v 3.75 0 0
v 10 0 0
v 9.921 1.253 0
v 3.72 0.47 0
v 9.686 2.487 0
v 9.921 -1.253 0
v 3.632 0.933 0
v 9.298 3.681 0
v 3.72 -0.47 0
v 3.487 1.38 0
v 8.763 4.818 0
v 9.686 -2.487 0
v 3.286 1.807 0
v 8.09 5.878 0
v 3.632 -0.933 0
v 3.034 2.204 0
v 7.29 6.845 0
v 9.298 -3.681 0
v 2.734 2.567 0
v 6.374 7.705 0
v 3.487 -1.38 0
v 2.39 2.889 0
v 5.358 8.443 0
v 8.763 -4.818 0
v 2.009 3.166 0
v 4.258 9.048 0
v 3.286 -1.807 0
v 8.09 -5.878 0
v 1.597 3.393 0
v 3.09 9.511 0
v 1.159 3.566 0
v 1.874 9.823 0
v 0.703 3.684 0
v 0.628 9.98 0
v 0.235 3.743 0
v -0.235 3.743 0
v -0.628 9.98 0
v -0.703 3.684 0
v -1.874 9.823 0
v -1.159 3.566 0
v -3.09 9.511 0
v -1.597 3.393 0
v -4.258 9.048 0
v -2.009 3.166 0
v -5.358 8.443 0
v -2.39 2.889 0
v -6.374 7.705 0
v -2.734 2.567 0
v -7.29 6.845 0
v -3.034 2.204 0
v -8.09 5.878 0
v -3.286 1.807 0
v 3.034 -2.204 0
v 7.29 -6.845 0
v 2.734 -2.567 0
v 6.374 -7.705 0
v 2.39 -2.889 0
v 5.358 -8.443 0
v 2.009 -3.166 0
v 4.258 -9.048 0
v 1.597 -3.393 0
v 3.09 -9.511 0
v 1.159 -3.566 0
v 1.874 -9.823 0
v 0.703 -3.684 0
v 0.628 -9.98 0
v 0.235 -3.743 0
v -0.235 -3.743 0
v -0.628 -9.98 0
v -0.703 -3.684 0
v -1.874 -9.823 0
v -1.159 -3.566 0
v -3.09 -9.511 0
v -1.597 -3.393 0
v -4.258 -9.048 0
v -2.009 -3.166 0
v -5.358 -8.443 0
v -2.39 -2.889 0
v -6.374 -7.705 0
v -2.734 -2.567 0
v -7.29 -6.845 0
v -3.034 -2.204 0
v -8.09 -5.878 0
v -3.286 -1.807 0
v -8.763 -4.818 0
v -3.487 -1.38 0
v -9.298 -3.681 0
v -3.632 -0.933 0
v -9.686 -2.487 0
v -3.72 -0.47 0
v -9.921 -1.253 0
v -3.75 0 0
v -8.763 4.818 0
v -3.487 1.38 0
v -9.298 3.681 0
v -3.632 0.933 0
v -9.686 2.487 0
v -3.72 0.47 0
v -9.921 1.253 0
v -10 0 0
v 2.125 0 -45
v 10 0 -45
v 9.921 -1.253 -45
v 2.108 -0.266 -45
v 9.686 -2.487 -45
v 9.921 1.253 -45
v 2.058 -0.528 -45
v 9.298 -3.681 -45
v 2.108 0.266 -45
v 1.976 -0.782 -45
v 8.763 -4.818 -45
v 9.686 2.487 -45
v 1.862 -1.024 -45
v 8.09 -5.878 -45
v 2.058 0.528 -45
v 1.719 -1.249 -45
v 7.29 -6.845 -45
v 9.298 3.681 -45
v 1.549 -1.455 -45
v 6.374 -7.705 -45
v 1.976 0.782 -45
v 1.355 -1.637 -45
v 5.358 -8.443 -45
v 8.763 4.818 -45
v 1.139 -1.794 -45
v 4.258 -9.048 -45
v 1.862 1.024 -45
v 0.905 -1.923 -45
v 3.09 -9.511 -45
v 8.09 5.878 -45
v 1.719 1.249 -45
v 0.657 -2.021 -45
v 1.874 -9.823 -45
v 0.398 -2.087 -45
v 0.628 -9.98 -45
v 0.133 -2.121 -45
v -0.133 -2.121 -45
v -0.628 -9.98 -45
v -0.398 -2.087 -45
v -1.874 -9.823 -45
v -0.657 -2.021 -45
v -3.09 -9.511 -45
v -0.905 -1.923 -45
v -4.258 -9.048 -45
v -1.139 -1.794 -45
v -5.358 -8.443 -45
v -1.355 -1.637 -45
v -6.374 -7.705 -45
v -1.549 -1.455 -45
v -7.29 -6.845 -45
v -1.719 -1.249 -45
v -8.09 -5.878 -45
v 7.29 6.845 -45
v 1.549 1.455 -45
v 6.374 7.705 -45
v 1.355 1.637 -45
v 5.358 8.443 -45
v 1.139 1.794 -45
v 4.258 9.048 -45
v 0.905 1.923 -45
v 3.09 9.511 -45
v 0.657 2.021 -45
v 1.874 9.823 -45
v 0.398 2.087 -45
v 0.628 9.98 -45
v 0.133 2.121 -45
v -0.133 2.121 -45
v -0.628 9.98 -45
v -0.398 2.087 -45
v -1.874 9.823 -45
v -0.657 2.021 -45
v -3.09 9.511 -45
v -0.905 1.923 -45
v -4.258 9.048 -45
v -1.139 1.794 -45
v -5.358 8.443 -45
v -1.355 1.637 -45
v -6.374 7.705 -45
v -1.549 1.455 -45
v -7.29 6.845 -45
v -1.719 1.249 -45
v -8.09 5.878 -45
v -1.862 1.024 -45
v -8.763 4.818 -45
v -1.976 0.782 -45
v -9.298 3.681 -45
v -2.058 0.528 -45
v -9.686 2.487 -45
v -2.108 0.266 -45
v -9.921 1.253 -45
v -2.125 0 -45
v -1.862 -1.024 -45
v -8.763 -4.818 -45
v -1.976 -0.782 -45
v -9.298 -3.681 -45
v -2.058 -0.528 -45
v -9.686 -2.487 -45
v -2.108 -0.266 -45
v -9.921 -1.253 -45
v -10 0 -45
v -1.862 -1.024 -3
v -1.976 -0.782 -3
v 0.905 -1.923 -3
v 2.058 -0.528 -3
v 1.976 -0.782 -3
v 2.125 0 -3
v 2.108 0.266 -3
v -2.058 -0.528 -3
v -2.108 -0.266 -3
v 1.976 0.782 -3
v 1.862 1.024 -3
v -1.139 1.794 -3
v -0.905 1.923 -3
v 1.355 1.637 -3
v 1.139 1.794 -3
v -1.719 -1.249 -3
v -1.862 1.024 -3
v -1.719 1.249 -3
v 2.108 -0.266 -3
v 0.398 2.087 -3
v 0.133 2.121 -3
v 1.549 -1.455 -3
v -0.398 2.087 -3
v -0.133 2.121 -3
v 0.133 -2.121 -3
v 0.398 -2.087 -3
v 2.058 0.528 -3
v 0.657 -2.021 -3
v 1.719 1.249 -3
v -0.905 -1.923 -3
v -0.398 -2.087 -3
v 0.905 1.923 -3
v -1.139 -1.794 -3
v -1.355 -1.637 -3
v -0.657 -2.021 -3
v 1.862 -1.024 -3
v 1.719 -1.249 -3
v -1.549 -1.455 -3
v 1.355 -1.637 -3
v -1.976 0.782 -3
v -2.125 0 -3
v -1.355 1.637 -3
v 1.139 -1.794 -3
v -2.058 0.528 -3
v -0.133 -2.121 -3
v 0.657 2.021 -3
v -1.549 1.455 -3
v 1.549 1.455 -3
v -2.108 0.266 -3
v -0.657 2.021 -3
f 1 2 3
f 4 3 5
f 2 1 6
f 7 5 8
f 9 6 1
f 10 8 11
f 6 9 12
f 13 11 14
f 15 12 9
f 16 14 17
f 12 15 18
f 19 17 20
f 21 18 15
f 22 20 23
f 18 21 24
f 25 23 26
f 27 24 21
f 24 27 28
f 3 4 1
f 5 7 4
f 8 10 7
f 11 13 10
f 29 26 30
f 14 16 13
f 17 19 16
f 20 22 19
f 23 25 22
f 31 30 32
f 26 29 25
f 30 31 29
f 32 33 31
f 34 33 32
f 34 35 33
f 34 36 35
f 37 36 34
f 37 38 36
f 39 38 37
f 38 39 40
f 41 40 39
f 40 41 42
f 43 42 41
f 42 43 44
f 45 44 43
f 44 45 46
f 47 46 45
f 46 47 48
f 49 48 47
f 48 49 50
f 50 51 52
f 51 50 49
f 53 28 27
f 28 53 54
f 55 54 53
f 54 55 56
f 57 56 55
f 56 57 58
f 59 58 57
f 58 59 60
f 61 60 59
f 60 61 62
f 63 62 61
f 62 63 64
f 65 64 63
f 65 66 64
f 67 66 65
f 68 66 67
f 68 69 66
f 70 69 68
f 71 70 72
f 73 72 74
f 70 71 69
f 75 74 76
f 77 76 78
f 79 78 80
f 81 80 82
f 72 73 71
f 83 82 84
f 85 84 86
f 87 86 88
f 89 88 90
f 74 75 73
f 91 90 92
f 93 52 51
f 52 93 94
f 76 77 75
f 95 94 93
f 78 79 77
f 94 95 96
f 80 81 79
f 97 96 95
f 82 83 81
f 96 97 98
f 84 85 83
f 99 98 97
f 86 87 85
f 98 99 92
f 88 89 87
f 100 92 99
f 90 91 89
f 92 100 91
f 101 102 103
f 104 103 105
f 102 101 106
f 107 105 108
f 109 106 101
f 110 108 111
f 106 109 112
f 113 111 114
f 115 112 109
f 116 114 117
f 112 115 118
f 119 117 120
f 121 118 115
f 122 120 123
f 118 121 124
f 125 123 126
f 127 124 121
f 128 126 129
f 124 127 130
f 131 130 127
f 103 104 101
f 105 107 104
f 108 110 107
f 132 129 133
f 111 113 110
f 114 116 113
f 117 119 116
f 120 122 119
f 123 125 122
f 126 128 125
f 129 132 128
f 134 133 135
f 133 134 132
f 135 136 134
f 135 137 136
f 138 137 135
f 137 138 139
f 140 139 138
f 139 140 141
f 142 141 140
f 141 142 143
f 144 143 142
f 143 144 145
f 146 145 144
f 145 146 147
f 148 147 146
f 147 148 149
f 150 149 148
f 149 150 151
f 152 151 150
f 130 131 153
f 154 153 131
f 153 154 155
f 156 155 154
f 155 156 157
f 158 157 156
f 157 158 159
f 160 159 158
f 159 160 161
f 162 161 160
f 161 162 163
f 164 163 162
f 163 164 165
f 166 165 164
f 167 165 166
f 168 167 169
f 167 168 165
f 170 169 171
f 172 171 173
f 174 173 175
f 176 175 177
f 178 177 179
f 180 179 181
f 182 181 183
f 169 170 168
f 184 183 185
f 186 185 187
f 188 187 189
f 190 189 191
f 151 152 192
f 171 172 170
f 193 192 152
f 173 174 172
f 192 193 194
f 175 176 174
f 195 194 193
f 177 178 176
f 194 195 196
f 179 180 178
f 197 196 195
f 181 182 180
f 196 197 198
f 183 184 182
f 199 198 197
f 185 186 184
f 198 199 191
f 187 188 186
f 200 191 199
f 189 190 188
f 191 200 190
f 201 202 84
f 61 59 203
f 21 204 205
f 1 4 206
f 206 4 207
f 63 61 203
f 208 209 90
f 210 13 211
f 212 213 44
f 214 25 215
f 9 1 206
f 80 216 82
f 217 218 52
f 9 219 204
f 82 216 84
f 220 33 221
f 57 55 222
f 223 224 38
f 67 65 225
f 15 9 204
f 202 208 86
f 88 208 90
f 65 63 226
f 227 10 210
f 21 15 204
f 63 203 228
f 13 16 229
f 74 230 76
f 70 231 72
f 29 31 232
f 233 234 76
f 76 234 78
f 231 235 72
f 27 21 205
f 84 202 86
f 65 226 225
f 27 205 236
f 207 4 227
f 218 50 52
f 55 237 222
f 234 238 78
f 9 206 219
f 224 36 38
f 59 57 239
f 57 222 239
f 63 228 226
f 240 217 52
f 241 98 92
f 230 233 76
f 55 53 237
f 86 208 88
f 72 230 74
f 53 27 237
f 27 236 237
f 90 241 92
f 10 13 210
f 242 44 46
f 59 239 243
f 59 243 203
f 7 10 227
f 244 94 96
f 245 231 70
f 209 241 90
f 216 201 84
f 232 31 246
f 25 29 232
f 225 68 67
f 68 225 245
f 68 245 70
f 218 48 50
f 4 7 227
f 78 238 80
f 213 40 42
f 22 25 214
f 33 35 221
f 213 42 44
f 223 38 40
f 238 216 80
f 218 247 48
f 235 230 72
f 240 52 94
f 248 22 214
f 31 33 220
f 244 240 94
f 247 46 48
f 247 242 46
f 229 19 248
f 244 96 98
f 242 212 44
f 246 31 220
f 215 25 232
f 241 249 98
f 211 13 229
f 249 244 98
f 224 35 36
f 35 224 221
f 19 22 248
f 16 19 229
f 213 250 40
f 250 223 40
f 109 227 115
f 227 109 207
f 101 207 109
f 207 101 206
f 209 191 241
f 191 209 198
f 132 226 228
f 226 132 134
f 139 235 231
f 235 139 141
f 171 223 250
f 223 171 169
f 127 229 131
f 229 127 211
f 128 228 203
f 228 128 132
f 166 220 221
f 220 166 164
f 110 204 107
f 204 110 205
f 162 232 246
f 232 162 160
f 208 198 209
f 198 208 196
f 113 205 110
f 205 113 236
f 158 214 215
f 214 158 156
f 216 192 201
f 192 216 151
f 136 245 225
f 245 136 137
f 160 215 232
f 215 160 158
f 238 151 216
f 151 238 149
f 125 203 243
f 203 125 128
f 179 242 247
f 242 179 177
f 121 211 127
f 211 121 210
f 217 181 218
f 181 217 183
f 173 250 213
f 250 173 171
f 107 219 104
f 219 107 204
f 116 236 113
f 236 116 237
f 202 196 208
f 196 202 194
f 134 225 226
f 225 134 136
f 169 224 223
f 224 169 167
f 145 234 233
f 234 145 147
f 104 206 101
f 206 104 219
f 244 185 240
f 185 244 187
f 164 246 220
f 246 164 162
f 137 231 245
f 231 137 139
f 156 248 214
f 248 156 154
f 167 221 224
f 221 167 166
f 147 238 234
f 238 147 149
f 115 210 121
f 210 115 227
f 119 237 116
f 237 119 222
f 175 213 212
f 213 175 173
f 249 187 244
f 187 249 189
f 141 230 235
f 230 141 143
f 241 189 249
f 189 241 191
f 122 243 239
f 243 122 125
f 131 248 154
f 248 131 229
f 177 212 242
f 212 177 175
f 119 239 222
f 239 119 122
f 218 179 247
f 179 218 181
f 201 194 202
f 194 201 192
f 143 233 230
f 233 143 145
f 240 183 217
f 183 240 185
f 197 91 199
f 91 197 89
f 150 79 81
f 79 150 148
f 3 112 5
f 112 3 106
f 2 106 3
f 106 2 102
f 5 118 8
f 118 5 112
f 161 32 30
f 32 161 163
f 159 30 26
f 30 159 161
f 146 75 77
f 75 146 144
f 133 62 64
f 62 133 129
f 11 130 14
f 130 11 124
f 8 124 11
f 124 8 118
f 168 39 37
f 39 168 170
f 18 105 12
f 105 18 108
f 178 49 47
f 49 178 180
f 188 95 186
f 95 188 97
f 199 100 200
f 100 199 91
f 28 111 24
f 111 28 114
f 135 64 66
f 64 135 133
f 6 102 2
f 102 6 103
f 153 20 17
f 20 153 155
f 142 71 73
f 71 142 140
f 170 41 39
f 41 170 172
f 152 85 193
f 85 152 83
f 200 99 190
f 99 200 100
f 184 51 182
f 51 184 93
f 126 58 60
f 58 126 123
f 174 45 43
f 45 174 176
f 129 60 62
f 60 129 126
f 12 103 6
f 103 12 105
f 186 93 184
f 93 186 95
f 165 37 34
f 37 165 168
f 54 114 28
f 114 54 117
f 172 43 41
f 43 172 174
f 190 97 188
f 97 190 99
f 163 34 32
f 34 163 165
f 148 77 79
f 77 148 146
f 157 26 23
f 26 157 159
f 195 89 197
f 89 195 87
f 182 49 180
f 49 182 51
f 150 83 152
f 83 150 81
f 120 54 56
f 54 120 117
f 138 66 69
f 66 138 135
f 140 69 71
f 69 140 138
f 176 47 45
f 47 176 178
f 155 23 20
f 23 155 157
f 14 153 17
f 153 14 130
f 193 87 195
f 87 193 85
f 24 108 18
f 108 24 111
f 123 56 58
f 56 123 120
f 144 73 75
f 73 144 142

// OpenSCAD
$fn = 50;


difference() {
	union() {
		translate(v = [0, 0, -45.0000000000]) {
			cylinder(h = 45, r = 10.0000000000);
		}
		cylinder(h = 0, r = 16.0000000000);
	}
	union() {
		translate(v = [0, 0, 0]) {
			rotate(a = [0, 0, 0]) {
				difference() {
					union() {
						#translate(v = [0, 0, -45.0000000000]) {
							cylinder(h = 45, r = 2.0000000000);
						}
						#translate(v = [0, 0, -3]) {
							cylinder(h = 3, r = 10.0000000000, r1 = 2.1250000000, r2 = 3.7500000000);
						}
						#translate(v = [0, 0, -45.0000000000]) {
							cylinder(h = 45, r = 2.1250000000);
						}
						#translate(v = [0, 0, -45.0000000000]) {
							cylinder(h = 45, r = 2.0000000000);
						}
					}
					union();
				}
			}
		}
	}
}
